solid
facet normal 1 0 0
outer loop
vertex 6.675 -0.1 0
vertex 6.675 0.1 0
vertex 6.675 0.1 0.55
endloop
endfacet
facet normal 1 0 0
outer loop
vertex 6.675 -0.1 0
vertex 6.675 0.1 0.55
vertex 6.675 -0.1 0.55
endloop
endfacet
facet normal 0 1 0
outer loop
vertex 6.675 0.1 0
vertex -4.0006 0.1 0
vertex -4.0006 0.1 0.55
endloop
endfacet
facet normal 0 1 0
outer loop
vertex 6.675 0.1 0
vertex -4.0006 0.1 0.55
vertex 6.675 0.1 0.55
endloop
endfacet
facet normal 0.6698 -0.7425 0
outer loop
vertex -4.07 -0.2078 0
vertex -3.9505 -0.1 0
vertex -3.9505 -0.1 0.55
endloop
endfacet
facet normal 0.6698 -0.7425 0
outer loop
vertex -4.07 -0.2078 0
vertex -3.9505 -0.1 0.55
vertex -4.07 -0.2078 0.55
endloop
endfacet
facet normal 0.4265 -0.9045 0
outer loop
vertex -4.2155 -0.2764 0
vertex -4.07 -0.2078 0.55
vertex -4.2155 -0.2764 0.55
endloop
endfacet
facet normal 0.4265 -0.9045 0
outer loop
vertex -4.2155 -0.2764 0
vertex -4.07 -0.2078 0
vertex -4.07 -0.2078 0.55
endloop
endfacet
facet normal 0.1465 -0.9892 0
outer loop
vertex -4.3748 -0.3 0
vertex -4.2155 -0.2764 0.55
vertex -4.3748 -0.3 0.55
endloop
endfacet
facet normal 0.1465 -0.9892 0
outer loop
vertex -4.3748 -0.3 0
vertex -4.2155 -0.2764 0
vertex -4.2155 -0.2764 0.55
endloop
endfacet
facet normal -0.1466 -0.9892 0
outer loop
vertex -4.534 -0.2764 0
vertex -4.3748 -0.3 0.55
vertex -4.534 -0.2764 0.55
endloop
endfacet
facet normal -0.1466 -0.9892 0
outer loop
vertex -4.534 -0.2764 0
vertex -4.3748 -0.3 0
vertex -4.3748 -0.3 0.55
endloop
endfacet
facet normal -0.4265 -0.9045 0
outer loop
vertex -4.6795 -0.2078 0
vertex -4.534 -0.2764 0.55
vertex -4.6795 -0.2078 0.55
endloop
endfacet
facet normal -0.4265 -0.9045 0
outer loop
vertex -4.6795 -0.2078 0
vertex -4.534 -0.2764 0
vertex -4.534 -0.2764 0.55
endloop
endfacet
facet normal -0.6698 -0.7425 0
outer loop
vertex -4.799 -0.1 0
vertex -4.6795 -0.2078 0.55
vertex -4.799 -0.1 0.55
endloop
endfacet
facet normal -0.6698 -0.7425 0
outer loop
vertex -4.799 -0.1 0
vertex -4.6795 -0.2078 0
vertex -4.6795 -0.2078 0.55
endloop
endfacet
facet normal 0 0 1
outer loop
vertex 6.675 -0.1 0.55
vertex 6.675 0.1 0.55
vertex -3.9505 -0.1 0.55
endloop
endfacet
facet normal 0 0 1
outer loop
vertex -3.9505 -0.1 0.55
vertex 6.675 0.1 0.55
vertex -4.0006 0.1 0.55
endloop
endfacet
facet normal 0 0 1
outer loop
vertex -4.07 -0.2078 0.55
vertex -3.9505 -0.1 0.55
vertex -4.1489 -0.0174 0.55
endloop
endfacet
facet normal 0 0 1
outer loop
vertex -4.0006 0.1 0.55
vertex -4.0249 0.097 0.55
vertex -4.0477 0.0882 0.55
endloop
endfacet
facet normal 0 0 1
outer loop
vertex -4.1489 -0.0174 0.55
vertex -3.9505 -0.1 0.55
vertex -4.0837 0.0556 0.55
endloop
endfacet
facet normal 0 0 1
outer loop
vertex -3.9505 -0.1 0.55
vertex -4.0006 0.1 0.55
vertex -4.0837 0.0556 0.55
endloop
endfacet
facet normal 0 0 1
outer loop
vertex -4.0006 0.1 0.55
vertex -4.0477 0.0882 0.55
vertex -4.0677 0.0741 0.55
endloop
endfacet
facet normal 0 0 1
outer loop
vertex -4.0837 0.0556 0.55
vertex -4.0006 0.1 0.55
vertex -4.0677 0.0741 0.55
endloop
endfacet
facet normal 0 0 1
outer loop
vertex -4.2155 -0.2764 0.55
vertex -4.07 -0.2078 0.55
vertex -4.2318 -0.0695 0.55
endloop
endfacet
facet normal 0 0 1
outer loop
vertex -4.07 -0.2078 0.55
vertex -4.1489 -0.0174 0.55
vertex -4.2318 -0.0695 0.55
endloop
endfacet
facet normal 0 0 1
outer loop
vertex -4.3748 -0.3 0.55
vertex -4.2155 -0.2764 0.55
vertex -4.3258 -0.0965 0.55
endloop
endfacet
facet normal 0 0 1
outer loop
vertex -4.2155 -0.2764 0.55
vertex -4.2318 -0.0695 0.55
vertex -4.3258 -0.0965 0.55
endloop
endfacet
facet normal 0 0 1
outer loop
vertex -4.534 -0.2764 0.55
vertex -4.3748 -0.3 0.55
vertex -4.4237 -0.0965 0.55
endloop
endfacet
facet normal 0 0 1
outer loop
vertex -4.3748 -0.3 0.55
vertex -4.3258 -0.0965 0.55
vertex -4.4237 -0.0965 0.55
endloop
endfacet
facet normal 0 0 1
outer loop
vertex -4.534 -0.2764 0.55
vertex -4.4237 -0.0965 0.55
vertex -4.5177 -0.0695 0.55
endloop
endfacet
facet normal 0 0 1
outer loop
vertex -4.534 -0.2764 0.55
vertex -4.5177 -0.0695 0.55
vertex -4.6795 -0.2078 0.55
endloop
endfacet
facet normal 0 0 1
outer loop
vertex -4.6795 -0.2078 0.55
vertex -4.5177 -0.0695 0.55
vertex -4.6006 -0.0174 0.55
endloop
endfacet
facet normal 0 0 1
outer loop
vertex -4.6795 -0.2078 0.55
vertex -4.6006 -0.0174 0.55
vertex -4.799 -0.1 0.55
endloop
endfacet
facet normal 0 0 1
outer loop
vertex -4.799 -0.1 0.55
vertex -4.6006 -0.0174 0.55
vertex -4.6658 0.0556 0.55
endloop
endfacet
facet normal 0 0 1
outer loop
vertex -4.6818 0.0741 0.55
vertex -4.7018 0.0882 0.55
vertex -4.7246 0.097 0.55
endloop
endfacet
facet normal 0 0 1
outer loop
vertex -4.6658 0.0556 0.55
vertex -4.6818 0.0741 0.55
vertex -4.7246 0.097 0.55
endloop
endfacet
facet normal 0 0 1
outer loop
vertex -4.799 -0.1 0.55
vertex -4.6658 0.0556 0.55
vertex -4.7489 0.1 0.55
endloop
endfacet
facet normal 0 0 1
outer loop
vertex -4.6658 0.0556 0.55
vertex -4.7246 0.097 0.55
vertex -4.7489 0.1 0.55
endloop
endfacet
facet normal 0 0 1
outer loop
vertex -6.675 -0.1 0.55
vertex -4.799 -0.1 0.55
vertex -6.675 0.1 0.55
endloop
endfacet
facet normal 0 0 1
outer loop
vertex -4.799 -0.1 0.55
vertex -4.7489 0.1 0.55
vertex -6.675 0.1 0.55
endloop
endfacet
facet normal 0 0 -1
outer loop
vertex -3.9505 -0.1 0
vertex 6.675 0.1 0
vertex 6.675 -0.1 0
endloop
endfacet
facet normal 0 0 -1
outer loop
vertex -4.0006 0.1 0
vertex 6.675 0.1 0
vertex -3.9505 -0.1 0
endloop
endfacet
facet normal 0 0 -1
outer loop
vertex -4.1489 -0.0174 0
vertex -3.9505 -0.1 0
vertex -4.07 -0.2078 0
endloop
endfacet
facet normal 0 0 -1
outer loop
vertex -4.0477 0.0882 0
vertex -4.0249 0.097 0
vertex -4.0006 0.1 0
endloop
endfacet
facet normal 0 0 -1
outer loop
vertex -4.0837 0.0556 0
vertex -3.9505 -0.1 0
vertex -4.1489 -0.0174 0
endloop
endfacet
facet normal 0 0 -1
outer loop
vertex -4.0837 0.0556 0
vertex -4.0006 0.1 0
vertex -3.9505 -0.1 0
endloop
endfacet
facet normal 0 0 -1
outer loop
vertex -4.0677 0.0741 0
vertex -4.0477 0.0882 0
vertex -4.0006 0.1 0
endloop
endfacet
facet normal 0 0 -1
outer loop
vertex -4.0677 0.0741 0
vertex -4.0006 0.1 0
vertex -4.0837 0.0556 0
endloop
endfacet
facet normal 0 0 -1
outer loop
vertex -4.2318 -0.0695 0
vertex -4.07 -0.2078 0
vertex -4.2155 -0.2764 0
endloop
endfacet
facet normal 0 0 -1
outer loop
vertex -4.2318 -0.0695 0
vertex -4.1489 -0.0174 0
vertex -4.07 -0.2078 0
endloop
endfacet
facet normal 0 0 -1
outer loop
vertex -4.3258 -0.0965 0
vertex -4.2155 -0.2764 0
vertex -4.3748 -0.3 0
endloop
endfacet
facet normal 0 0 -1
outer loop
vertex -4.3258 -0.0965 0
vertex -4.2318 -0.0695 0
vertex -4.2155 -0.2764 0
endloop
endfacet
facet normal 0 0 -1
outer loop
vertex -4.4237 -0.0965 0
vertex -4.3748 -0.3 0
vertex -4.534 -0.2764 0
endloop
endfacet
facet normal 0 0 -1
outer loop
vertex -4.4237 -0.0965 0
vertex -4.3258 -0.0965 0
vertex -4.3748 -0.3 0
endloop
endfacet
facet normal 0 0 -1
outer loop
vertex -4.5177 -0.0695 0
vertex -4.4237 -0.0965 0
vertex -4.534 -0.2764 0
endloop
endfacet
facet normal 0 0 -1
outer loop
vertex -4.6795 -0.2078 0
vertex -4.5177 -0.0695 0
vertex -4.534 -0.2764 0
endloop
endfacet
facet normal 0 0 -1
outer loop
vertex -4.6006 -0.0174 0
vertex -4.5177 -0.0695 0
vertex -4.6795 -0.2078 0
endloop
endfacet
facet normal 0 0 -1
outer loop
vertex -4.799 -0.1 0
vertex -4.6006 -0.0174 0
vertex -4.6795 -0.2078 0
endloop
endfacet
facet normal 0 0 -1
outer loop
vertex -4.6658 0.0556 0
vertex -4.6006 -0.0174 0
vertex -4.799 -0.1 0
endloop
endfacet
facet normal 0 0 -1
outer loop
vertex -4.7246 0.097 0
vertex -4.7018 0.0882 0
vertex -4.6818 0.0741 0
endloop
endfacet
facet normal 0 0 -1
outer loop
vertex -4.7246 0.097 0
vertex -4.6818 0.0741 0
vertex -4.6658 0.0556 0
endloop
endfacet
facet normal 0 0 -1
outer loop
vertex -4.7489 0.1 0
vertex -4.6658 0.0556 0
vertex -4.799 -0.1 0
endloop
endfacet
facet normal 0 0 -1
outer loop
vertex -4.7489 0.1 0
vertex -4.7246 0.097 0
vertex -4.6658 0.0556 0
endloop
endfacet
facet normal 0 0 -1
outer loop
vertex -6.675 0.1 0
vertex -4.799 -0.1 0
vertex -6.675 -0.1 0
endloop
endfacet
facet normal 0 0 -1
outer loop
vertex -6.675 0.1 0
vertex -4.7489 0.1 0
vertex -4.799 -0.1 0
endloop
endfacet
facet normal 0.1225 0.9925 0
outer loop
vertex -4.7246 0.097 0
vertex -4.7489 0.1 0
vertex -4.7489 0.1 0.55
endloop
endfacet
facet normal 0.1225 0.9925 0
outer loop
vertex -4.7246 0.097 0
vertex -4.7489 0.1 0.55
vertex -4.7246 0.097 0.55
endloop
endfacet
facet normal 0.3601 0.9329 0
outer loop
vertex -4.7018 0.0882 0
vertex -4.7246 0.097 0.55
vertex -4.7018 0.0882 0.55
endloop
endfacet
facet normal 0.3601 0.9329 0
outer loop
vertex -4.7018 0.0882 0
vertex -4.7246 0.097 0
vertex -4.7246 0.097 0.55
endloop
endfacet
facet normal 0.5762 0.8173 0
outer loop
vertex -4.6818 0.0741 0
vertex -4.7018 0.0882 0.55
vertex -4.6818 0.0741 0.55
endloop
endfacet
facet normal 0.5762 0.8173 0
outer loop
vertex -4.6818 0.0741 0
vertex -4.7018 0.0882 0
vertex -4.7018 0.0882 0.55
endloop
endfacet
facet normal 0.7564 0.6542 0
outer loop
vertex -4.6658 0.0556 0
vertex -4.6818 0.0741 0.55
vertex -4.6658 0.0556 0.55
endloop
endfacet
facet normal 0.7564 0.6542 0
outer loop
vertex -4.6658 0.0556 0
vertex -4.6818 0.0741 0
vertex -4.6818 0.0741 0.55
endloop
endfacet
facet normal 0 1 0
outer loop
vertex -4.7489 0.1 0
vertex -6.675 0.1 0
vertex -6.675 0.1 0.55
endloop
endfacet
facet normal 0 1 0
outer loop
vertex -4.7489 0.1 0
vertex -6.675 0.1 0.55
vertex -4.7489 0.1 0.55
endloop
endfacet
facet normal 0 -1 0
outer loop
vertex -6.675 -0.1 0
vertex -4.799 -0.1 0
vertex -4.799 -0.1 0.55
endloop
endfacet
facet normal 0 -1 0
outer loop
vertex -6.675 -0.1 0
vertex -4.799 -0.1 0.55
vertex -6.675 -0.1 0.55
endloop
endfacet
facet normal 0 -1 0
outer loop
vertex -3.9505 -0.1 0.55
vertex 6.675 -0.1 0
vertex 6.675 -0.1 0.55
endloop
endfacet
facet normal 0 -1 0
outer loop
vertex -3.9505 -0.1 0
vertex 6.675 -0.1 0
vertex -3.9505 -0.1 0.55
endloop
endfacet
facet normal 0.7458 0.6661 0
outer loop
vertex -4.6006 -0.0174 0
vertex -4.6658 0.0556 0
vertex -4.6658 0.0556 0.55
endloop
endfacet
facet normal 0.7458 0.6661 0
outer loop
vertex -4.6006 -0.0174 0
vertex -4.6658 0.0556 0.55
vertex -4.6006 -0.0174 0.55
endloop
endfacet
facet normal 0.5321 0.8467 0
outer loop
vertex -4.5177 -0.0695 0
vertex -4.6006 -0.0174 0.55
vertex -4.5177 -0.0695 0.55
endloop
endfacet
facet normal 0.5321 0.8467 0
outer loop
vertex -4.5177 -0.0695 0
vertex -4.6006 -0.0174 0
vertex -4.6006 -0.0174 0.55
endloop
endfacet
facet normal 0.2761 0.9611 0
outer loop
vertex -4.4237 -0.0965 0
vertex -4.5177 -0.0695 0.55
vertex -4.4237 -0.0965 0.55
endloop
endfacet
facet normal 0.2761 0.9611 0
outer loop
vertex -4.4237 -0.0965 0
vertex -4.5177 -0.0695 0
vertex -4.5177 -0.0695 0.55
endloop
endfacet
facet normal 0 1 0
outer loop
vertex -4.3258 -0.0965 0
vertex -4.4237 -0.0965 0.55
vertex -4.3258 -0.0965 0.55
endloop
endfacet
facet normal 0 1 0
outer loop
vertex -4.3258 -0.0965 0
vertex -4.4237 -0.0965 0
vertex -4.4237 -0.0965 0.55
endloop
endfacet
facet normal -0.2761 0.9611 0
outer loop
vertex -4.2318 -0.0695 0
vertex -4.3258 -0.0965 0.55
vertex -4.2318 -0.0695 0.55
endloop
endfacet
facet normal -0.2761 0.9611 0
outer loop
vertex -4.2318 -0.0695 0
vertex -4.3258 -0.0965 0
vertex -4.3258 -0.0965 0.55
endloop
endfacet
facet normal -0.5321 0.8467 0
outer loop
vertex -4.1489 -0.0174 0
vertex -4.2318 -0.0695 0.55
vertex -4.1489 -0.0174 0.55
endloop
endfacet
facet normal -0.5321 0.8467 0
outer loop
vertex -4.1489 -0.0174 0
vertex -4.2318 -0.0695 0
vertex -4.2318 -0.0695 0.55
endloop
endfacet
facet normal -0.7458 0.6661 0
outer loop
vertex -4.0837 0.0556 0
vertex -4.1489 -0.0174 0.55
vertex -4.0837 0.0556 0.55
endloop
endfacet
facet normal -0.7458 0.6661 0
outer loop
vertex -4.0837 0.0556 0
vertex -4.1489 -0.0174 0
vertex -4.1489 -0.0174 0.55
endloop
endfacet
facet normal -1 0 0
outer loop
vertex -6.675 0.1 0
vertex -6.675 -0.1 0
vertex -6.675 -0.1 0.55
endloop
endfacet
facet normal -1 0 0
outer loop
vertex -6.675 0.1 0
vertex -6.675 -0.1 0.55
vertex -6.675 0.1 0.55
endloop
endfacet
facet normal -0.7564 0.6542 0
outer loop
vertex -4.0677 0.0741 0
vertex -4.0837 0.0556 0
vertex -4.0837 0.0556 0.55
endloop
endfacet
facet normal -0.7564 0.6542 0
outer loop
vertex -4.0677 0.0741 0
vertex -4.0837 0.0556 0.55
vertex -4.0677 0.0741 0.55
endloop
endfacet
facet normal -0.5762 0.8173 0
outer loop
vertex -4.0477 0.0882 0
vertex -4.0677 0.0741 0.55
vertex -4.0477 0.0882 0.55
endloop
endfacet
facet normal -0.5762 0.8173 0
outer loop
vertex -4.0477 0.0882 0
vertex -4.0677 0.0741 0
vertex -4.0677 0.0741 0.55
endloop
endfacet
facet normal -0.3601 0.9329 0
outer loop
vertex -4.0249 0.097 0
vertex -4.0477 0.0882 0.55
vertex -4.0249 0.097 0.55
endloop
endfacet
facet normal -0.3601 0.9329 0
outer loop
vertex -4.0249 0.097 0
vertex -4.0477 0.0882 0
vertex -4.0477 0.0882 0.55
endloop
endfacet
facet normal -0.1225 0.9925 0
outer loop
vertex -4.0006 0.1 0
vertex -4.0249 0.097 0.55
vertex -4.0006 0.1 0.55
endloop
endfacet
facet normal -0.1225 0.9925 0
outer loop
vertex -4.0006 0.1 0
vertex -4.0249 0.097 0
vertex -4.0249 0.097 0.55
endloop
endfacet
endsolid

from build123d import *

# Parameters (mm, degrees)
RESSALTO_EXTRUS_O1_DEPTH = 0.55


with BuildPart() as part:
    # Esboço1 → Ressalto-extrusão1 (new body)
    with BuildSketch(Plane.XY):
        with BuildLine():
            Line((-4.000595656, 0.1), (6.675, 0.1))
            Line((6.675, 0.1), (6.675, -0.1))
            Line((6.675, -0.1), (-3.9505, -0.1))
            ThreePointArc((-3.9505, -0.1), (-4.37475, -0.299982947), (-4.799, -0.1))
            Line((-4.799, -0.1), (-6.675, -0.1))
            Line((-6.675, -0.1), (-6.675, 0.1))
            Line((-6.675, 0.1), (-4.748904344, 0.1))
            ThreePointArc((-4.748904344, 0.1), (-4.701765902, 0.088192785), (-4.665758934, 0.055559345))
            ThreePointArc((-4.665758934, 0.055559345), (-4.37475, -0.099982947), (-4.083741066, 0.055559345))
            ThreePointArc((-4.083741066, 0.055559345), (-4.047734098, 0.088192785), (-4.000595656, 0.1))
        make_face()
    extrude(amount=RESSALTO_EXTRUS_O1_DEPTH)


solid = part.part
